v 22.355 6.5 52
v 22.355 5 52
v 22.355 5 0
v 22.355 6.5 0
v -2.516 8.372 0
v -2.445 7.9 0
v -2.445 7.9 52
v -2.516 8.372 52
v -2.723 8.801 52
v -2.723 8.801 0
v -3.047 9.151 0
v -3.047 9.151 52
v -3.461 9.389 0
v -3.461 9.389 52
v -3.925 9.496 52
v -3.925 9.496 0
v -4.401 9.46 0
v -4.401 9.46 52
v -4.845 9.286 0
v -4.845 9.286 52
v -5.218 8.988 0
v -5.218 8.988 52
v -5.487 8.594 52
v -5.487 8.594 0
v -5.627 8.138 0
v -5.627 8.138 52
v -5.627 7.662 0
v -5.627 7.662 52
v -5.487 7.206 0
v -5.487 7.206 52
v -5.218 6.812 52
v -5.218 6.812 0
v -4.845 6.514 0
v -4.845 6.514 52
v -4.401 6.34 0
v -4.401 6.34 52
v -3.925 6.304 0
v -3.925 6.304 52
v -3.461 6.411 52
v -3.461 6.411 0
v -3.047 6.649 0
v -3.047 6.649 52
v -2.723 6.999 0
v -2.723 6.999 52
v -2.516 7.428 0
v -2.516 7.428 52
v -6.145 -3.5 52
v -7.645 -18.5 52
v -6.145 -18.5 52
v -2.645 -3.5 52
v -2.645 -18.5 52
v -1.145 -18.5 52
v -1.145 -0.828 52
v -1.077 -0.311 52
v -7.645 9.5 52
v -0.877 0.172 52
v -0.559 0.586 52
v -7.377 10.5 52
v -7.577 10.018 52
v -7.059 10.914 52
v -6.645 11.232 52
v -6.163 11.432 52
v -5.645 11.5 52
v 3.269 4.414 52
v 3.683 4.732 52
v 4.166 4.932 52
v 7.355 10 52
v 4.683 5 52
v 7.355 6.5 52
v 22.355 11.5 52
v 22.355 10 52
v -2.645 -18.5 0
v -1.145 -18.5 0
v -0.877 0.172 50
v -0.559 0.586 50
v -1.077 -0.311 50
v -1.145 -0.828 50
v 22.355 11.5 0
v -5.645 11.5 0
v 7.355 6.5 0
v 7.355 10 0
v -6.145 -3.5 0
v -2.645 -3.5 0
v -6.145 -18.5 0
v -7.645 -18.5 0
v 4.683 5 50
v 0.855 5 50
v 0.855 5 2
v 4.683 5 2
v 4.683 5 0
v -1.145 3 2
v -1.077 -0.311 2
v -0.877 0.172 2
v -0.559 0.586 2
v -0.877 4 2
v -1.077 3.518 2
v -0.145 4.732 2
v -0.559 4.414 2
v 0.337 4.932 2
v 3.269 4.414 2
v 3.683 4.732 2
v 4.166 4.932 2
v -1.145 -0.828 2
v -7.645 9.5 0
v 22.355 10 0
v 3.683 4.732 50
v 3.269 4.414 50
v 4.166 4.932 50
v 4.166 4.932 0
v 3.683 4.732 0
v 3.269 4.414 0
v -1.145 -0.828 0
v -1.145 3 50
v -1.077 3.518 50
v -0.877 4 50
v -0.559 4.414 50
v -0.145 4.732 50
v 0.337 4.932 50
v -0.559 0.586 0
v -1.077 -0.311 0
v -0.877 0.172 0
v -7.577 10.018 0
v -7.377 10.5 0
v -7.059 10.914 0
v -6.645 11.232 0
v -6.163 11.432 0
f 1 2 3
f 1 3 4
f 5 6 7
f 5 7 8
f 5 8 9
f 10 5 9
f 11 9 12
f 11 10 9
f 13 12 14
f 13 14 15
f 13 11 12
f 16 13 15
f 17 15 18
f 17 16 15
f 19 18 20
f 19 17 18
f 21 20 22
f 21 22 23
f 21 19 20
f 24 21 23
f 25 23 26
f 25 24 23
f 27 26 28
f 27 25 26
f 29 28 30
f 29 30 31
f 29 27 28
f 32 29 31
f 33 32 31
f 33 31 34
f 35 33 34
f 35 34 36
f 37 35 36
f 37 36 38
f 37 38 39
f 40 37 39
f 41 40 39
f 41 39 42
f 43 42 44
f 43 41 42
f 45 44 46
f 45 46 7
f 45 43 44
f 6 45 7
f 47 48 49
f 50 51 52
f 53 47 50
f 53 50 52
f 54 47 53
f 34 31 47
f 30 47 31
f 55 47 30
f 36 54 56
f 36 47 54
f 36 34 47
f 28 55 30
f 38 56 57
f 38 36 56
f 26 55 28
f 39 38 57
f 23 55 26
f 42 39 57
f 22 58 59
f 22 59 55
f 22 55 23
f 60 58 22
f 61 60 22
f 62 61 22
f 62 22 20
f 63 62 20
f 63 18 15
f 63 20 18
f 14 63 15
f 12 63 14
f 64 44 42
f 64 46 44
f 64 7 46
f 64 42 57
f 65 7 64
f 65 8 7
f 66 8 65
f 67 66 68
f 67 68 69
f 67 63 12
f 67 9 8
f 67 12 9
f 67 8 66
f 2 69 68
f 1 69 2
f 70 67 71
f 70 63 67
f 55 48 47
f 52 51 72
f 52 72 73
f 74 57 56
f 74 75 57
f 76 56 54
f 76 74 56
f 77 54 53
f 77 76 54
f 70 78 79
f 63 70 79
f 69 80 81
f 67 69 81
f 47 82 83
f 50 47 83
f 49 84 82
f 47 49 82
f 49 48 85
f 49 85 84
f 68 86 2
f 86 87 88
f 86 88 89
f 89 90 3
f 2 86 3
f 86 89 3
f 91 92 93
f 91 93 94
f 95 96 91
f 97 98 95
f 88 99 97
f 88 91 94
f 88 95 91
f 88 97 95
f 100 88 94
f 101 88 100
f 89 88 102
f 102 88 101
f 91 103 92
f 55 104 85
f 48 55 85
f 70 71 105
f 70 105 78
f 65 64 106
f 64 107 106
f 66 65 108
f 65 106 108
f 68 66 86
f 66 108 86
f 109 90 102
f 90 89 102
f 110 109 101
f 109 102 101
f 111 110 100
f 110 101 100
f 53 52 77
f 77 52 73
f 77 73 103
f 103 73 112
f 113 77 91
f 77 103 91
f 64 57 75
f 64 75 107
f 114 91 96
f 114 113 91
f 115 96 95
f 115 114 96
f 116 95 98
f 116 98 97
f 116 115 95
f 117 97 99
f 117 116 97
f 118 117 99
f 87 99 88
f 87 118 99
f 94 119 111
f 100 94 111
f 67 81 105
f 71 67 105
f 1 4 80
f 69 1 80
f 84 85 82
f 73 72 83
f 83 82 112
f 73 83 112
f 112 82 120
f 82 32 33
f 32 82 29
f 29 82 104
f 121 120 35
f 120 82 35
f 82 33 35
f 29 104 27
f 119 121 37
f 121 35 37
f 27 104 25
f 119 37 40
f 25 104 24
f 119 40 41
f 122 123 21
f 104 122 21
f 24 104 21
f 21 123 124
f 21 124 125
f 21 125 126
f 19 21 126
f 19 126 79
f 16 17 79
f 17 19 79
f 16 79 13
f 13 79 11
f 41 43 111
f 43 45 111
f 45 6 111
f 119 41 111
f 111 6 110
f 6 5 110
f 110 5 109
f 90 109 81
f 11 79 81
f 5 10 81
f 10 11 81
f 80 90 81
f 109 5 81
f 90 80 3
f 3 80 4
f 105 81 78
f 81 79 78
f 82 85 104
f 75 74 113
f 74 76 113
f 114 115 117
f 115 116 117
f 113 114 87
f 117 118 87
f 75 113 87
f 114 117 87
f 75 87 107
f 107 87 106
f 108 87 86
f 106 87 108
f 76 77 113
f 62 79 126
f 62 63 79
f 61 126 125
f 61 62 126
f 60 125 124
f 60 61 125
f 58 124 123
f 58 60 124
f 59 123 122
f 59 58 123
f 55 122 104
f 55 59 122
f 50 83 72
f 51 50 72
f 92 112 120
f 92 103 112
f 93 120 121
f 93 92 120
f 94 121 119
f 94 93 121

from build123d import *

# Parameters (mm, degrees)
F0_R     = 1.6
F1_DEPTH = 52
F2_DEPTH = 2
F4_DEPTH = 2
F5_R     = 2


with BuildPart() as f1:
    # F0 (on Top) → F1 (new body)
    with BuildSketch(Plane.XY):
        Polygon((22.3549354323, 10), (22.3549354323, 11.5), (-7.6450645677, 11.5), (-7.6450645677, -18.5), (-6.1450645677, -18.5), (-6.1450645677, -3.5), (-2.6450645677, -3.5), (-2.6450645677, -18.5), (-1.1450645677, -18.5), (-1.1450645677, 0), (-1.1450645677, 5), (3.8549354323, 5), (22.3549354323, 5), (22.3549354323, 6.5), (7.3549354323, 6.5), (7.3549354323, 10), align=None)
        with Locations((-4.0450645677, 7.9)):
            Circle(F0_R, mode=Mode.SUBTRACT)
    extrude(amount=F1_DEPTH)

    # F0 (on Top) → F2 (join)
    with BuildSketch(Plane.XY):
        Polygon((-1.1450645677, 0), (3.8549354323, 5), (-1.1450645677, 5), align=None)
    extrude(amount=F2_DEPTH)

    # F3 (on face) → F4 (join)
    with BuildSketch(Plane.XY.offset(52)):
        Polygon((-1.1450645677, 0), (3.8549354323, 5), (-1.1450645677, 5), align=None)
    extrude(amount=-F4_DEPTH)

    # F5
    f5_edges = [f1.edges().sort_by_distance(p)[0] for p in [
        (-1.145065, 5, 26),
        (3.854935, 5, 1),
        (-1.145065, 0, 1),
        (-1.145065, 0, 51),
        (3.854935, 5, 51),
        (-7.645065, 11.5, 26),
    ]]
    fillet(f5_edges, radius=F5_R)


solid = f1.part
